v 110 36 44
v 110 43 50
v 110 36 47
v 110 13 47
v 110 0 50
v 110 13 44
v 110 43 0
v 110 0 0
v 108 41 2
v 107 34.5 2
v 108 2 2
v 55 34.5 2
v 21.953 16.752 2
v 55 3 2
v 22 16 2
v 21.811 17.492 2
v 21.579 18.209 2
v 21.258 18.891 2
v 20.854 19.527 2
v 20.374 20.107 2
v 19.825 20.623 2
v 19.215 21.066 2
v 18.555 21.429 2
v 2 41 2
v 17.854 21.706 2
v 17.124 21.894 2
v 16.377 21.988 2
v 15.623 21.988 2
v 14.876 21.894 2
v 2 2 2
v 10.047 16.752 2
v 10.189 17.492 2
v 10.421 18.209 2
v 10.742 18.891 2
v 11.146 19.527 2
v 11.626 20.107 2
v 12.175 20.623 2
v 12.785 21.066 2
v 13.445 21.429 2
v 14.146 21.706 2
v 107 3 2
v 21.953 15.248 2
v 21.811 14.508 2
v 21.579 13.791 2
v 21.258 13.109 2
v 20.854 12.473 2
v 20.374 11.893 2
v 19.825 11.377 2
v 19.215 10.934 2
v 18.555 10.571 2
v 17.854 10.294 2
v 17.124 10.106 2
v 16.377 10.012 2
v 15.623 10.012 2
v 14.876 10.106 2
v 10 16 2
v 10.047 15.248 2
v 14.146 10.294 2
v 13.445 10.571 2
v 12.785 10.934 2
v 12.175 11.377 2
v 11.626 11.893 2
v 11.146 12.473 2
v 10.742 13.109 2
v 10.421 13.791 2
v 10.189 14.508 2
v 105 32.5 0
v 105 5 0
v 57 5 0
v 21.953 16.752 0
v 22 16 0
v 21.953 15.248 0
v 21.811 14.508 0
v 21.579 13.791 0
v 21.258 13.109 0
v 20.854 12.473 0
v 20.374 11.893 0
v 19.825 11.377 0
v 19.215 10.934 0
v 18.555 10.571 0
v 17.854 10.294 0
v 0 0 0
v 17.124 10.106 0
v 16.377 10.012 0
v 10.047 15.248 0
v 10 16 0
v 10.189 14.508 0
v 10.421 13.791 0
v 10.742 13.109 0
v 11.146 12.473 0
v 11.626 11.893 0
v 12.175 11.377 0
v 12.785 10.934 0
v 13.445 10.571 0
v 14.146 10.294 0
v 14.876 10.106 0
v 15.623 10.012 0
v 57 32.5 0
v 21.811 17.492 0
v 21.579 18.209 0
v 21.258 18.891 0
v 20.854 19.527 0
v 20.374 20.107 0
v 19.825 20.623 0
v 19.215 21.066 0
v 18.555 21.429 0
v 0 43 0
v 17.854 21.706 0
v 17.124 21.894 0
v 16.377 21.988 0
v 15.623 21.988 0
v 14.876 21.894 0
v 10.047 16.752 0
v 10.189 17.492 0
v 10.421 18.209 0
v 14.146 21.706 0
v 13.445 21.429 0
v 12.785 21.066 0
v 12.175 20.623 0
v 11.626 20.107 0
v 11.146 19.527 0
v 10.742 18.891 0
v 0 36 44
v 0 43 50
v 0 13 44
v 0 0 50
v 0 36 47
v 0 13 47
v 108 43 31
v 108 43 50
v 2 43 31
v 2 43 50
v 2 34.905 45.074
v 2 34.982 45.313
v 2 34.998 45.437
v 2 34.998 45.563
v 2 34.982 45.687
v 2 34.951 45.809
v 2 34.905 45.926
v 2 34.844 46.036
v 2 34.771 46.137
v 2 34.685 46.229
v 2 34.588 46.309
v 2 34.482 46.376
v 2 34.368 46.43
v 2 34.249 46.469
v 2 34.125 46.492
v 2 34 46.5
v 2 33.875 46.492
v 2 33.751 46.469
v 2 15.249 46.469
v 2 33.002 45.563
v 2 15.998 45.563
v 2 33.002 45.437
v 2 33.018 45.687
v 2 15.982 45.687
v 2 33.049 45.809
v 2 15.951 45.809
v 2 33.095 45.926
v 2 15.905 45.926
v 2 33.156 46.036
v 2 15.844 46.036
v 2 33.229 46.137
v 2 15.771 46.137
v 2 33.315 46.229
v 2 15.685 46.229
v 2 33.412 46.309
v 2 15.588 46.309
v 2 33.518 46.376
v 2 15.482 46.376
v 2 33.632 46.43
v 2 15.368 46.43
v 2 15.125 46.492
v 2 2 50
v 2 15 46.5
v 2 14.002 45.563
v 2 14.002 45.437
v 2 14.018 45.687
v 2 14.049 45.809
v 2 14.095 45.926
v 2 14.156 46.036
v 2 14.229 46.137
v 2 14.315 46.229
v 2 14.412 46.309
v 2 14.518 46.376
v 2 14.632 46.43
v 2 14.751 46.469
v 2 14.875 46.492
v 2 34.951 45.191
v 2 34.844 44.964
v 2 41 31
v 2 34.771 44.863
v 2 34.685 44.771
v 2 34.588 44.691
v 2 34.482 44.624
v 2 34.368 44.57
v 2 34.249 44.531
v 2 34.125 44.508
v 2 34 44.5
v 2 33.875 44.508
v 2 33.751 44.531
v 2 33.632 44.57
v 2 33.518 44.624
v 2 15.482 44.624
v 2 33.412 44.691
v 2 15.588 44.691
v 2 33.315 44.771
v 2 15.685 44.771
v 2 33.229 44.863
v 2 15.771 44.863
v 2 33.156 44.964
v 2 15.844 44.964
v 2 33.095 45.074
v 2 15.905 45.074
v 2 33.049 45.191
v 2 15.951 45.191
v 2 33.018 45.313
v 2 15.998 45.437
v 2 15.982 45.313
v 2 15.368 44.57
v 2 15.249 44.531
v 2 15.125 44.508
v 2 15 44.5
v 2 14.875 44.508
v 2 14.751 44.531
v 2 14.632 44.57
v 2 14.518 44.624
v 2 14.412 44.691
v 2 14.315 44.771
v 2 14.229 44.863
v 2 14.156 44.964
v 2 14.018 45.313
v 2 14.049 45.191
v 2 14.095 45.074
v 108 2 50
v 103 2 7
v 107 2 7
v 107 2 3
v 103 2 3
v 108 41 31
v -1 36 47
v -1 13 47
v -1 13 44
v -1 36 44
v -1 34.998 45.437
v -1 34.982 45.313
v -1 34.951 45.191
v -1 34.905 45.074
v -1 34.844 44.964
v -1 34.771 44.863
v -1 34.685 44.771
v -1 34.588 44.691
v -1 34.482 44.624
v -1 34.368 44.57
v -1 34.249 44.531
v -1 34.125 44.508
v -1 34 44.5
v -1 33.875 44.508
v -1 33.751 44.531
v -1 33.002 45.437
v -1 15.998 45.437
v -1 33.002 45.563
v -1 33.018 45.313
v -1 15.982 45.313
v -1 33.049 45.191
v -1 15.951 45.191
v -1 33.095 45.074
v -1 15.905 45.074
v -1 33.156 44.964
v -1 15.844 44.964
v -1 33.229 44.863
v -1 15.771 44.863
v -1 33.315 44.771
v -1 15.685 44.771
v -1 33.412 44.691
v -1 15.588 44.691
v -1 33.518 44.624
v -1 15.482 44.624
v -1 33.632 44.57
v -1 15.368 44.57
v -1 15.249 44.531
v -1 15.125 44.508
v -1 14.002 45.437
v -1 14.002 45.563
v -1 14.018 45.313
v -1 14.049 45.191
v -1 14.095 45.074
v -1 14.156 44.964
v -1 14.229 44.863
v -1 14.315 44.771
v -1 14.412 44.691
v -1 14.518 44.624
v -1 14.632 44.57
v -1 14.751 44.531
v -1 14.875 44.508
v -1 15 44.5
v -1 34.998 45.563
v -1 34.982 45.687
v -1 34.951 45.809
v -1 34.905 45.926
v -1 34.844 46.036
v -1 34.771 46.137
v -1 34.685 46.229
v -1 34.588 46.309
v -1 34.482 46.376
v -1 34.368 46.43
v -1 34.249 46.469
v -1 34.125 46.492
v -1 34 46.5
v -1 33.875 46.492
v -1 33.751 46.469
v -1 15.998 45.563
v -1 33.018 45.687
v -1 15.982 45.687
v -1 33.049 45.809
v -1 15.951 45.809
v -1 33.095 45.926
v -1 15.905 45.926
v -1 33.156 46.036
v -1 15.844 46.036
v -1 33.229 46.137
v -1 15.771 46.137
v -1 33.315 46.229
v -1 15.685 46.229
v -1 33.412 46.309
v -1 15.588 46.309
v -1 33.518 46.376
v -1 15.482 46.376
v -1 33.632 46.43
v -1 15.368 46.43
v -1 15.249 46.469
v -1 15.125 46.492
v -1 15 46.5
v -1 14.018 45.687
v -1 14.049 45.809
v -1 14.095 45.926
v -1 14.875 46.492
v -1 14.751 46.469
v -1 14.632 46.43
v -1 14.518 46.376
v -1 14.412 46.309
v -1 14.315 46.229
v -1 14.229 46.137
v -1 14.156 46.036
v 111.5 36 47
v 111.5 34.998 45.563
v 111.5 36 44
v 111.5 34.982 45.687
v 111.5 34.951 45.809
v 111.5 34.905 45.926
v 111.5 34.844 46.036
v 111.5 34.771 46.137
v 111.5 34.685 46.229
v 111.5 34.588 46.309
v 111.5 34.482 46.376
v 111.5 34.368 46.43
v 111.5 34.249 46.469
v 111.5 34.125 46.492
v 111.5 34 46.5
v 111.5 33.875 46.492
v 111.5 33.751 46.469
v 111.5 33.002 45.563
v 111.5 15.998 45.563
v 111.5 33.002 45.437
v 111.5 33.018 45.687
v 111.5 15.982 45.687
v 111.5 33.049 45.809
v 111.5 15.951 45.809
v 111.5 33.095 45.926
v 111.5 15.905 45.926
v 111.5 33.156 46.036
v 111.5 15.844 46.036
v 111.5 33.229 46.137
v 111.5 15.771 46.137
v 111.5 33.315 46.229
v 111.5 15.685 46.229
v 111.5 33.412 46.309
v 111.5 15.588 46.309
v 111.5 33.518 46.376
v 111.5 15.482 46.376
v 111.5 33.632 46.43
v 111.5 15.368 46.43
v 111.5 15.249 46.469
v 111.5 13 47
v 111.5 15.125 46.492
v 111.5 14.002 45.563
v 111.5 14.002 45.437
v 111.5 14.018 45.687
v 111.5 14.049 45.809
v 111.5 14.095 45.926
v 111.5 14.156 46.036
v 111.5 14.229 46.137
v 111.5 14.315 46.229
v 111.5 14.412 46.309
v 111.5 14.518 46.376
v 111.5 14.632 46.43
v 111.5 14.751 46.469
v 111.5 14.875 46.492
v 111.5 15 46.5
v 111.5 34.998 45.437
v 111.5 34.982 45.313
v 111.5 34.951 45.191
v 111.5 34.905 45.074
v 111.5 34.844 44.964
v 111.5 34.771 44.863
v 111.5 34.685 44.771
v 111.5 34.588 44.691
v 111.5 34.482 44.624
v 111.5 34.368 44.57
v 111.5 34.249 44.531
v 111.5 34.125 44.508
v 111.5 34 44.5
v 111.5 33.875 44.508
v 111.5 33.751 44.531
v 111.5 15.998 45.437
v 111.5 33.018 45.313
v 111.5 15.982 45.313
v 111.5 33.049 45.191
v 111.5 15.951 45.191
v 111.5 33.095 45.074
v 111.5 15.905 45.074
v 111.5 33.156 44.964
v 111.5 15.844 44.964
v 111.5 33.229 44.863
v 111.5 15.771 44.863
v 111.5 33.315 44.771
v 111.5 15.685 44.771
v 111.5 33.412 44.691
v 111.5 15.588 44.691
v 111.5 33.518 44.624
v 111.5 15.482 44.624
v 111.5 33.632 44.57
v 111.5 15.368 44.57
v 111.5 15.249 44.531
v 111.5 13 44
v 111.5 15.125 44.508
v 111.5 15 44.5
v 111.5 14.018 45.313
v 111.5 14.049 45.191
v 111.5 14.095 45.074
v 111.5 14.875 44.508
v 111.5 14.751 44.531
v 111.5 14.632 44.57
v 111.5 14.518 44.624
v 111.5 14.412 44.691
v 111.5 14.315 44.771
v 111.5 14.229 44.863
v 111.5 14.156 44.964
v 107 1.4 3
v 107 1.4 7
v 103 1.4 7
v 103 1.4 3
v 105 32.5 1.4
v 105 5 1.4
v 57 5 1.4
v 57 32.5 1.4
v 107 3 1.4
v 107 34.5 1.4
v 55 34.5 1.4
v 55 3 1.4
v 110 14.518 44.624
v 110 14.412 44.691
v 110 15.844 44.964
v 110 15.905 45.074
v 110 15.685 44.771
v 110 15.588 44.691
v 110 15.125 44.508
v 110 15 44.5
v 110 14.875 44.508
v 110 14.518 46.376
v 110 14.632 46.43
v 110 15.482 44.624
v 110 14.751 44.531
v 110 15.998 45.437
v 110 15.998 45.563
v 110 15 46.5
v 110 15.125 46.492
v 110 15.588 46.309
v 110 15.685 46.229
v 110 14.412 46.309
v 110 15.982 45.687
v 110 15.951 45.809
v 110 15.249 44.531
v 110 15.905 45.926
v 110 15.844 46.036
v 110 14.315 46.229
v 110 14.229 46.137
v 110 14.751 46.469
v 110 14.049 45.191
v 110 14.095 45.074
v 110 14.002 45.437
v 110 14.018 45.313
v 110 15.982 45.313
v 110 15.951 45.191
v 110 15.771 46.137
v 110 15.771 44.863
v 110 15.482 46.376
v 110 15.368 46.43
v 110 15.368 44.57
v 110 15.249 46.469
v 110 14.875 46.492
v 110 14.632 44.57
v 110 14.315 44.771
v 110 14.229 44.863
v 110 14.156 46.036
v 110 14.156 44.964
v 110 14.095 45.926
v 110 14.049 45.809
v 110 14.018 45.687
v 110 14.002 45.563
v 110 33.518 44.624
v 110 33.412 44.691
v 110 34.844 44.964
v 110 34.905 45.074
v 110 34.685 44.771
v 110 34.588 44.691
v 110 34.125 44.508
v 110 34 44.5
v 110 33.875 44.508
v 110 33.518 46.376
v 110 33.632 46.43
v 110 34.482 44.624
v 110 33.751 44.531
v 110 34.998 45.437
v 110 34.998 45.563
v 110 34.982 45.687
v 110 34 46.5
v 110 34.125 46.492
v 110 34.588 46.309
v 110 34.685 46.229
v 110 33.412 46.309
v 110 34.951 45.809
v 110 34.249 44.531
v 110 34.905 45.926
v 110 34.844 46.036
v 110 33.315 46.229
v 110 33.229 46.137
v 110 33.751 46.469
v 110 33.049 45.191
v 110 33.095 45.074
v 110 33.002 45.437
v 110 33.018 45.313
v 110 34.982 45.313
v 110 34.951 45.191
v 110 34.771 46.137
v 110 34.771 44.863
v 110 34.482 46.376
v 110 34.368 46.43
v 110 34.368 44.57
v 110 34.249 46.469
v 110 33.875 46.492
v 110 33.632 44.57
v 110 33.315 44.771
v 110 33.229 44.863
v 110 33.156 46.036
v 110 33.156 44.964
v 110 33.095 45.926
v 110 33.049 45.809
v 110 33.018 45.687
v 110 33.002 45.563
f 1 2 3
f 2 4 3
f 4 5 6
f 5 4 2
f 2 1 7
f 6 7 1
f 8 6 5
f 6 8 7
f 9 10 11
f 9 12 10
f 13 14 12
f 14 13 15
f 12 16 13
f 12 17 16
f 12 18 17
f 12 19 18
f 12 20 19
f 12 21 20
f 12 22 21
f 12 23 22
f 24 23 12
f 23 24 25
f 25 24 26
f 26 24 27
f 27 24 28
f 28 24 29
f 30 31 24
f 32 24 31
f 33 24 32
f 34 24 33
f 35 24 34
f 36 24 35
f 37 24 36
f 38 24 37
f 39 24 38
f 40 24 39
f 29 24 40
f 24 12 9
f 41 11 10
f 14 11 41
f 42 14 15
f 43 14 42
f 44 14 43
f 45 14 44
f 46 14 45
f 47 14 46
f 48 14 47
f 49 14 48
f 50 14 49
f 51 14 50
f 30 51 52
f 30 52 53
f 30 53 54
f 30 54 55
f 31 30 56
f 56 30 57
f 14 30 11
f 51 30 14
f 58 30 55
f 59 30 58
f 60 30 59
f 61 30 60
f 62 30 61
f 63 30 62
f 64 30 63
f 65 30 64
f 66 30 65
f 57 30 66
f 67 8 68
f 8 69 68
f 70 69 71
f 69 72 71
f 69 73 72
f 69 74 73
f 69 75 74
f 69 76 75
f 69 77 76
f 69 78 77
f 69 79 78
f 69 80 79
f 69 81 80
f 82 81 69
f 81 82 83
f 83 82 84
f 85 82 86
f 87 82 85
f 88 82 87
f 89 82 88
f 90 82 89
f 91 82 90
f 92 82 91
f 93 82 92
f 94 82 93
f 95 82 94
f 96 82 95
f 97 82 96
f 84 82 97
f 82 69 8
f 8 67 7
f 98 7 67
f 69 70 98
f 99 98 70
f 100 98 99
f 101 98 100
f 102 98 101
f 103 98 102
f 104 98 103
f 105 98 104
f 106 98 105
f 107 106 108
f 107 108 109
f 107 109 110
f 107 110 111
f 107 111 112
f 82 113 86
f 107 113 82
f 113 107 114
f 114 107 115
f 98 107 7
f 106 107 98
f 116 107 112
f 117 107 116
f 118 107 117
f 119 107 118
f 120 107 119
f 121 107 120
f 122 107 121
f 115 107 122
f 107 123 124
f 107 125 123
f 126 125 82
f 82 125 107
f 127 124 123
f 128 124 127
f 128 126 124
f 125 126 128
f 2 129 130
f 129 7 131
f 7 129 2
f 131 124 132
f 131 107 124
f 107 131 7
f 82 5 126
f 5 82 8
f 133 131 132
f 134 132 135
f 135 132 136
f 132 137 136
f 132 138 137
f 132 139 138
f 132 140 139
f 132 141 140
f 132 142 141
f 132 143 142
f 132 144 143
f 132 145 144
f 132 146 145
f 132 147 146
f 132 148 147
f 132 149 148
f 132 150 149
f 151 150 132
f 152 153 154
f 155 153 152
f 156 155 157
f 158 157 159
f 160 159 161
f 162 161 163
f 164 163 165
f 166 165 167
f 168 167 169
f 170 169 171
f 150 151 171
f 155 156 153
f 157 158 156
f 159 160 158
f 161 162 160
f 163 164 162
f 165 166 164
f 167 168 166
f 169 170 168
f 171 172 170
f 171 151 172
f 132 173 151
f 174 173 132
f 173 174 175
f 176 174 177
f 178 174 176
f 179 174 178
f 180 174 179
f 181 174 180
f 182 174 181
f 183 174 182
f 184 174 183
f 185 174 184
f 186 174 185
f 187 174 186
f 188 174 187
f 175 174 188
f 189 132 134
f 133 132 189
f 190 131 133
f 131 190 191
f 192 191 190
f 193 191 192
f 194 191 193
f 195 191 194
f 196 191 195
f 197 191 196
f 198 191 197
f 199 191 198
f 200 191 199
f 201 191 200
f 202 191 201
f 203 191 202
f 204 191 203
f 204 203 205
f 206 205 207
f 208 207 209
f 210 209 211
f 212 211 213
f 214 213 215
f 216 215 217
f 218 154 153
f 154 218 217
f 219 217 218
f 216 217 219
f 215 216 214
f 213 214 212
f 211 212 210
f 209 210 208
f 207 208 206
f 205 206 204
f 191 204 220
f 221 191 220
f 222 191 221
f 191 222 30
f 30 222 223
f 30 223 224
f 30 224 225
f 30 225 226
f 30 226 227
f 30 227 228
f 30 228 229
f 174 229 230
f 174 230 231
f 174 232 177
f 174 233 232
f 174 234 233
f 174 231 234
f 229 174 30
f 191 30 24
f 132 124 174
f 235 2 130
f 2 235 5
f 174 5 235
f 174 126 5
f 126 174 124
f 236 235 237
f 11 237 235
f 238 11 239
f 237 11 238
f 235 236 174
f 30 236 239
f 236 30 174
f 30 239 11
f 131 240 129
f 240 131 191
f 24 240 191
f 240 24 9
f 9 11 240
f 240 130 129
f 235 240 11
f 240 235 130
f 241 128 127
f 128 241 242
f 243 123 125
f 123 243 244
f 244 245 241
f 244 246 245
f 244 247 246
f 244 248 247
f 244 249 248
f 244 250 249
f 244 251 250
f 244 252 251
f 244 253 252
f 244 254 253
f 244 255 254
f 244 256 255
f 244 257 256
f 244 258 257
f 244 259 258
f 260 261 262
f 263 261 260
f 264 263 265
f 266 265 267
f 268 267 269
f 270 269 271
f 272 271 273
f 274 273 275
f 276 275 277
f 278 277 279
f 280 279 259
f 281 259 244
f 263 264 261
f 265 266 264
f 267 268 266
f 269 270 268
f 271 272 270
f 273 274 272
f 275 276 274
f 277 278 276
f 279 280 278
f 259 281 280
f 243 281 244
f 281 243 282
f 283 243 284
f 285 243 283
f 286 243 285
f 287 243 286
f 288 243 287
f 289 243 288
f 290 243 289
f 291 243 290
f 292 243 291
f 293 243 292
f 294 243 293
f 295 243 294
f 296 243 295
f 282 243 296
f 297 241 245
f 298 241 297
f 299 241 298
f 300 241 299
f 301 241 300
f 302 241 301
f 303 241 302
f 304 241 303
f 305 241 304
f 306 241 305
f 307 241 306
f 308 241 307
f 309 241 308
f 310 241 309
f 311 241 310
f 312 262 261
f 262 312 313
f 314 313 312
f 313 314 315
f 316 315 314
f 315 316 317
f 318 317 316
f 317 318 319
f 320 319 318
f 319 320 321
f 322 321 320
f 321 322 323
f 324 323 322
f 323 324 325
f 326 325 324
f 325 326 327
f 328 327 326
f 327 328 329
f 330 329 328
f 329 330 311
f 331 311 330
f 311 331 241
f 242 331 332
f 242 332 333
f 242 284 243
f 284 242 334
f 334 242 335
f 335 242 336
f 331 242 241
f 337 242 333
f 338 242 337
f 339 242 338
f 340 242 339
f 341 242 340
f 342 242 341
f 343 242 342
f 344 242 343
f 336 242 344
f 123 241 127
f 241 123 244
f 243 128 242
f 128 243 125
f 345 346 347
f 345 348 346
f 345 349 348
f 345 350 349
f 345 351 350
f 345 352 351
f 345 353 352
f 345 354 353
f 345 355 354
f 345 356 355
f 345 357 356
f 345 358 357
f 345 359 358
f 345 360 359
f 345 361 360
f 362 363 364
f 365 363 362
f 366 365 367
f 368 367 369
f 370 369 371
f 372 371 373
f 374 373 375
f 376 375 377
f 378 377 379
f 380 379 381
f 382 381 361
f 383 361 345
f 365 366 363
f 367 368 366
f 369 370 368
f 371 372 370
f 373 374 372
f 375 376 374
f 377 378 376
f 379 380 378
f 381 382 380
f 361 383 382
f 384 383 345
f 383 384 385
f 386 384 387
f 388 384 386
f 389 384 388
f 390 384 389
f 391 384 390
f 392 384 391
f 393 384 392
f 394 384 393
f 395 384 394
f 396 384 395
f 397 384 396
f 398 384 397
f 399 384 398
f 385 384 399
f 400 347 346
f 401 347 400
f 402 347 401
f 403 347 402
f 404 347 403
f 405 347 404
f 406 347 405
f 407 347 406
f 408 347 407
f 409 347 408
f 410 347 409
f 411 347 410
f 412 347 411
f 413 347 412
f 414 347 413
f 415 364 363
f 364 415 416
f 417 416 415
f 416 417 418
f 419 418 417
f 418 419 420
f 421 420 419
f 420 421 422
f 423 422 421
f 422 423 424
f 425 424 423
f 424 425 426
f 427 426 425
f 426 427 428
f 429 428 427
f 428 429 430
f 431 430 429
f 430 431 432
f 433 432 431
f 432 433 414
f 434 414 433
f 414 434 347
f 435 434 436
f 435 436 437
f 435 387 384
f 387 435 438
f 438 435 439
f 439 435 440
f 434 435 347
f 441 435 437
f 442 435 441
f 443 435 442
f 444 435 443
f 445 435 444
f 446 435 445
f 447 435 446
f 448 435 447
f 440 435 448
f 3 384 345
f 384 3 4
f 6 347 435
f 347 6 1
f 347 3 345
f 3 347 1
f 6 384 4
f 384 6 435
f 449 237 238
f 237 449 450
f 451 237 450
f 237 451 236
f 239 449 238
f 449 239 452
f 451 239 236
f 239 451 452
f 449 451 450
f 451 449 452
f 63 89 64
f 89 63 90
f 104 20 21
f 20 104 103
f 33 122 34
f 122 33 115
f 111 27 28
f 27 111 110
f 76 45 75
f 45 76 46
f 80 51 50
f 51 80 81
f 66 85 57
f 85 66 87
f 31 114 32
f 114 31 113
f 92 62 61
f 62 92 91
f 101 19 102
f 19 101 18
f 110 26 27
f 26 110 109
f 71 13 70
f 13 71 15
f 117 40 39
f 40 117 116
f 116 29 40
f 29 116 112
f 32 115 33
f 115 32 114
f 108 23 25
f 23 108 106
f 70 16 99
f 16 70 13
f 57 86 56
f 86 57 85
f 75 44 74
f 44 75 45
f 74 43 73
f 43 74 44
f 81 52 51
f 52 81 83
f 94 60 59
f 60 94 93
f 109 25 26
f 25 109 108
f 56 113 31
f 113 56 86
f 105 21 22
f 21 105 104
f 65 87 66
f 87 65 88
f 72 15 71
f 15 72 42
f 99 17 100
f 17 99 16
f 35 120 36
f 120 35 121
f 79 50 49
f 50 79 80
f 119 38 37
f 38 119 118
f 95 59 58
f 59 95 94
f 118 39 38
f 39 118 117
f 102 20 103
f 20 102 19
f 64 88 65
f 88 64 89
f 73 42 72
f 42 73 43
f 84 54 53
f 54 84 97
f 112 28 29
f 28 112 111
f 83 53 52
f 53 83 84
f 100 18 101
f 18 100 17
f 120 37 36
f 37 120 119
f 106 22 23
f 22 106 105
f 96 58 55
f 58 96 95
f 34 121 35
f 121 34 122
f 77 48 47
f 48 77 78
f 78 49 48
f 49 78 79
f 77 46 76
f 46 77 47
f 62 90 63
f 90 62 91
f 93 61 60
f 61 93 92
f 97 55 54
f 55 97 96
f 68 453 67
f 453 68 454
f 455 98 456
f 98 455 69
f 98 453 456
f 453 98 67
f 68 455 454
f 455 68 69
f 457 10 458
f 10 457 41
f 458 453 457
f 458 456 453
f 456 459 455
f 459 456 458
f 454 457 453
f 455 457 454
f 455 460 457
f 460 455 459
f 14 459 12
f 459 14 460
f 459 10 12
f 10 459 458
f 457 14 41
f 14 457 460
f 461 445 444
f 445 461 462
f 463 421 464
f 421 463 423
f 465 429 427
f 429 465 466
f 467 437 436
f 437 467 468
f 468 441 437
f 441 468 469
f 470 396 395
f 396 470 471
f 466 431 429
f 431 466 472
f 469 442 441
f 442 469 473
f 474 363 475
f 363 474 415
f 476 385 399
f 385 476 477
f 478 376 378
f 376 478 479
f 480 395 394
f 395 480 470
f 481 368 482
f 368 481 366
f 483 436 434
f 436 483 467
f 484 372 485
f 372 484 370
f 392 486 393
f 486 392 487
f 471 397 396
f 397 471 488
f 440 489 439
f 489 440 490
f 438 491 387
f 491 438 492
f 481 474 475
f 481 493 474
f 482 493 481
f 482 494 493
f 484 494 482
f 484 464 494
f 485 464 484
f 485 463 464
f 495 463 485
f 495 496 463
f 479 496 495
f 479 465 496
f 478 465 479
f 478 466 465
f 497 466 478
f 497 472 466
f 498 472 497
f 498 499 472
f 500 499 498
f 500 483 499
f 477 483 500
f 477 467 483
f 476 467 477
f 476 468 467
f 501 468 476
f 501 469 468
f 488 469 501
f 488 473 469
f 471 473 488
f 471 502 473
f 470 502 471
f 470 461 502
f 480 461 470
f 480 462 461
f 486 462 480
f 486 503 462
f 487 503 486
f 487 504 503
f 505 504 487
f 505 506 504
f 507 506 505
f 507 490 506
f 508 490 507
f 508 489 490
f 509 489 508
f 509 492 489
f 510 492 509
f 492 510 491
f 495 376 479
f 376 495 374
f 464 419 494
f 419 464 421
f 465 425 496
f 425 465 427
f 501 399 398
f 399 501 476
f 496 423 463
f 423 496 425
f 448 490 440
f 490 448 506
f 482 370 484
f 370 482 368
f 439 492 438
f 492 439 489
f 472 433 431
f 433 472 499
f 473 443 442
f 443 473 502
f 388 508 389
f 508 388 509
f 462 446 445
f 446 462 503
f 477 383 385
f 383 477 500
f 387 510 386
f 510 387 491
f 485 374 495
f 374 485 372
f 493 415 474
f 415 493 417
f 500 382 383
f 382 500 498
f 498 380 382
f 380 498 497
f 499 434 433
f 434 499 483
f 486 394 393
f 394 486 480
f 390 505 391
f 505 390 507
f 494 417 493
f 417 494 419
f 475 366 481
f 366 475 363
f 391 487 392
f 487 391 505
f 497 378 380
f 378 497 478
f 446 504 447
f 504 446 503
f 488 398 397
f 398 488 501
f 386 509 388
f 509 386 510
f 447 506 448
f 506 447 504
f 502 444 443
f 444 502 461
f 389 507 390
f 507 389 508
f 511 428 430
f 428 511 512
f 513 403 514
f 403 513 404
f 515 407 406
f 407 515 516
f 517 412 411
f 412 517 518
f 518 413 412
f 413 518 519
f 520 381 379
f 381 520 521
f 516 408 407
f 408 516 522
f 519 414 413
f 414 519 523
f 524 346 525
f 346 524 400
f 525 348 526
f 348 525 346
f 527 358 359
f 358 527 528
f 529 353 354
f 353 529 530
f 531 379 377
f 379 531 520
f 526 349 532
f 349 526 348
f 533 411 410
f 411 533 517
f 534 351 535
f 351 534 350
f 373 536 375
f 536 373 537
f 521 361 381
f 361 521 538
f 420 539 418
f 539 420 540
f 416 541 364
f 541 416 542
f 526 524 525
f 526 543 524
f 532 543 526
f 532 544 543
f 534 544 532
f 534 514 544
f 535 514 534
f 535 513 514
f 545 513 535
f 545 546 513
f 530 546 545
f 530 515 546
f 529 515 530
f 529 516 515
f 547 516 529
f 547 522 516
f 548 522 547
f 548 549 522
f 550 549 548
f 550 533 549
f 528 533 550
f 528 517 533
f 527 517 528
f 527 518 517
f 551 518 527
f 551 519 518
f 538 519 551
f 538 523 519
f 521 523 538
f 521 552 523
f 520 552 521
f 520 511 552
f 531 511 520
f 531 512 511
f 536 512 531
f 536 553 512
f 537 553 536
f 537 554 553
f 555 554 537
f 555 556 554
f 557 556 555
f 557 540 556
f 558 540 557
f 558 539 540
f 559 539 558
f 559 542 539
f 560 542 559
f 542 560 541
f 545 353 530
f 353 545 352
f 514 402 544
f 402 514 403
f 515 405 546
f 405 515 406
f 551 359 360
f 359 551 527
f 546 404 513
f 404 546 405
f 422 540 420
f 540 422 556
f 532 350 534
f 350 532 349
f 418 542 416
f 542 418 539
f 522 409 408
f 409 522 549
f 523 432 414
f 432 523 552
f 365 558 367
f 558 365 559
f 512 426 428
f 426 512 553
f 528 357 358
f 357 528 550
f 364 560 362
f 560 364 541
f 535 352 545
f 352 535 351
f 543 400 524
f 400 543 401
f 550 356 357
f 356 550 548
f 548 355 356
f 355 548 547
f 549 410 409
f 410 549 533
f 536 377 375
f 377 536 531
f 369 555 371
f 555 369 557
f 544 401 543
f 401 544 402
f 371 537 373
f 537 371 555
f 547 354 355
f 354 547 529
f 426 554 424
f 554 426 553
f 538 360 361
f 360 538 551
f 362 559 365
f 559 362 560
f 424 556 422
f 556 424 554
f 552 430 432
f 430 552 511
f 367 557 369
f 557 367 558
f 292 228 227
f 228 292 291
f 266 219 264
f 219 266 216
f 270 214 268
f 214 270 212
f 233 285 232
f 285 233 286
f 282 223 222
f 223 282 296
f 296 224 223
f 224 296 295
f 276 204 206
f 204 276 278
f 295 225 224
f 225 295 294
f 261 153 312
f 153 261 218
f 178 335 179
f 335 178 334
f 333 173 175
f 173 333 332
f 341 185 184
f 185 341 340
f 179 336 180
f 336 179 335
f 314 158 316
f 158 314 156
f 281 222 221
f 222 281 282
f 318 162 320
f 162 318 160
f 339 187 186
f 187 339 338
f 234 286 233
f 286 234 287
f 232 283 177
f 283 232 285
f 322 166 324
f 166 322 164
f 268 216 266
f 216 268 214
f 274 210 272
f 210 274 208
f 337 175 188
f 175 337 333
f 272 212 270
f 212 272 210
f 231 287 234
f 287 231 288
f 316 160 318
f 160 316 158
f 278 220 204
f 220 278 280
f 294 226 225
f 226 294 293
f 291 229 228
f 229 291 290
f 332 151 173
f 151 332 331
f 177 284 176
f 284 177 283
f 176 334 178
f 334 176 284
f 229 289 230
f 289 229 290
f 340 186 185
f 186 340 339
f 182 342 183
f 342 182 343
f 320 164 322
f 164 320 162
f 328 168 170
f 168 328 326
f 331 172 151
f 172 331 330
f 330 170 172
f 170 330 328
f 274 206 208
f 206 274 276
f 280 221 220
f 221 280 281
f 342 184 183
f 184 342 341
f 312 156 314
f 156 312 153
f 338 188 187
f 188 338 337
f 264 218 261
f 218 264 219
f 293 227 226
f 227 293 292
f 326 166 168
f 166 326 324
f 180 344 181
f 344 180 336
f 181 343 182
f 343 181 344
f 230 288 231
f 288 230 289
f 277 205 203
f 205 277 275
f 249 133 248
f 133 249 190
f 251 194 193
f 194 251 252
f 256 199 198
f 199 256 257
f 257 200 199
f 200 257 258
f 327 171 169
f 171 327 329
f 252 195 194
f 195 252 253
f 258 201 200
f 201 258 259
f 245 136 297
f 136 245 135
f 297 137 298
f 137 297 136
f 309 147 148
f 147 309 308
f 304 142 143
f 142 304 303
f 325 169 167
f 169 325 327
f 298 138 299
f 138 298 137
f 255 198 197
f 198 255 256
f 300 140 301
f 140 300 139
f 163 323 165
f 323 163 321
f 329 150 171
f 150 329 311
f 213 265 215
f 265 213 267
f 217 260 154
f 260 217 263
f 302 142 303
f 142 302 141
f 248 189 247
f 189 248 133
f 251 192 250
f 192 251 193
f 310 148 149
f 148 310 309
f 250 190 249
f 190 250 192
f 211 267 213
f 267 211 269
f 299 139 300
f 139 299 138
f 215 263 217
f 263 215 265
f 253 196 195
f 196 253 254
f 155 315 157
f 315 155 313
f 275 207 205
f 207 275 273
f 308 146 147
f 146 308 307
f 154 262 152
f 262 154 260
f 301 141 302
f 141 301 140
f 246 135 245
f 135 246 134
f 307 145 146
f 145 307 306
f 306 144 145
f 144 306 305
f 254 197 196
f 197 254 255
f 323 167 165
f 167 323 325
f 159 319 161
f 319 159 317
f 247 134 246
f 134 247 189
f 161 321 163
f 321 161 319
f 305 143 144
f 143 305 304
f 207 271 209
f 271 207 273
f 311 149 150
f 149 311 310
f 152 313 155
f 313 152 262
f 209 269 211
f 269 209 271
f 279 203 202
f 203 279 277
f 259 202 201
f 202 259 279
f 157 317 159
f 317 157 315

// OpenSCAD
/*************************************************************************************************
Power Supply Terminal Cover for the power supply commonly used with the Bukobot and other 3d printers
Author: Mike Thompson (thingiverse: mike_linus)
Date Last Modified: 11/03/2013 4:19pm
Description: simply change the cutout parameters to suit. Note: do not change length, height, depth and thickness parameters for the base unless you want to change the core dimensions.
**************************************************************************************************/


//***************************************************************
//change these cutout parameters to suit you own switch size etc.
//***************************************************************

// Length of a cutout for a switch on top
switch_cutout_length=0;
// Width of the same cutout
switch_cutout_width=0;
// Allowed thickness for the snap in switch to mount propperly
switch_cutout_thickness=1.4;

// Radius of hole for power LED 
led_cutout_radius=0;
// Radius of gromet for cables on the front.
grommet_cutout_radius=6;

// Length of snapin power plug cutout
power_plug_cutout_length=48;
// Widht of the same cutout
power_plug_cutout_width=27.5;
// Allowed thickness for the snap in panel to mount propperly
power_plug_cutout_thickness=1.4;
// Radius of screw holes in the side
screw_hole_cutout_radius=1;

// The inside distance between the two sides of the psu
base_length=110;
// The height of the gap in the PSU. Meassure from the PCB up
base_height=43;
// The depth you want your cover to be. More depth = more space for cables
base_depth=50;
// The thickness of all walls, except for around the cutouts.
base_thickness=2;
// Meassure from the end of the PSU to where the top shroud starts.
base_overlap=19;


/* [hidden] */
//***************************************************************
//don't change these base parameters unless you want to change the core dimensions.
//***************************************************************
hole_resolution=50;
$fn=hole_resolution;
cutout_flange_width=2;



module base(){
cube([base_length,base_height,base_thickness]);
cube([base_thickness,base_height,base_depth]);
cube([base_length,base_thickness,base_depth]);
translate([0,base_height-base_thickness,0])cube([
  base_length,
  base_thickness,
  base_depth-base_overlap
  ]);//Bottom plate for extended covers
translate([base_length-base_thickness,0,0])cube([
  base_thickness,
  base_height,
  base_depth]);
translate([-1,13,base_depth-6])cube([1.5,23,3]);//slot retainer
translate([base_length,13,base_depth-6])cube([1.5,23,3]);//slot retainer
}

difference(){
base();
#translate([base_length-switch_cutout_length-5,0,5])cube([
  switch_cutout_length,
  base_thickness,
  switch_cutout_width]);  //switch cutout
 
#translate([base_length-switch_cutout_length-5-cutout_flange_width,switch_cutout_thickness,5-cutout_flange_width]) cube([
  switch_cutout_length+cutout_flange_width*2,
  base_thickness,
  switch_cutout_width+cutout_flange_width*2]);

translate([8,3,9])rotate([90,0,0])cylinder(r=led_cutout_radius,h=5);  //led cutout
#translate([10+grommet_cutout_radius,10+grommet_cutout_radius,0])cylinder(r=grommet_cutout_radius,h=5);  // Power out cutout
  
#translate([base_length-power_plug_cutout_length-5,5,0])cube([
  power_plug_cutout_length,
  power_plug_cutout_width,
  base_thickness]);//240v plug cutout

#translate([base_length-power_plug_cutout_length-5-cutout_flange_width,5-cutout_flange_width,power_plug_cutout_thickness]) cube([
  power_plug_cutout_length+cutout_flange_width*2,
  power_plug_cutout_width+cutout_flange_width*2,
  base_thickness-power_plug_cutout_thickness]);  

//translate([7.5,12.75,0])cylinder(r=screw_hole_cutout_radius,h=5);  //240v plug screw hole
//translate([48,12.75,0])cylinder(r=screw_hole_cutout_radius,h=5);  //240v plug screw hole
translate([base_length,15,base_depth-6+1.5])rotate([0,90,0])cylinder(r=screw_hole_cutout_radius,h=5);  //retainer screw hole
translate([base_length,34,base_depth-6+1.5])rotate([0,90,0])cylinder(r=screw_hole_cutout_radius,h=5);  //retainer screw hole
translate([-1,15,base_depth-6+1.5])rotate([0,90,0])cylinder(r=screw_hole_cutout_radius,h=5);  //retainer screw hole
translate([-1,34,base_depth-6+1.5])rotate([0,90,0])cylinder(r=screw_hole_cutout_radius,h=5);  //retainer screw hole
}
